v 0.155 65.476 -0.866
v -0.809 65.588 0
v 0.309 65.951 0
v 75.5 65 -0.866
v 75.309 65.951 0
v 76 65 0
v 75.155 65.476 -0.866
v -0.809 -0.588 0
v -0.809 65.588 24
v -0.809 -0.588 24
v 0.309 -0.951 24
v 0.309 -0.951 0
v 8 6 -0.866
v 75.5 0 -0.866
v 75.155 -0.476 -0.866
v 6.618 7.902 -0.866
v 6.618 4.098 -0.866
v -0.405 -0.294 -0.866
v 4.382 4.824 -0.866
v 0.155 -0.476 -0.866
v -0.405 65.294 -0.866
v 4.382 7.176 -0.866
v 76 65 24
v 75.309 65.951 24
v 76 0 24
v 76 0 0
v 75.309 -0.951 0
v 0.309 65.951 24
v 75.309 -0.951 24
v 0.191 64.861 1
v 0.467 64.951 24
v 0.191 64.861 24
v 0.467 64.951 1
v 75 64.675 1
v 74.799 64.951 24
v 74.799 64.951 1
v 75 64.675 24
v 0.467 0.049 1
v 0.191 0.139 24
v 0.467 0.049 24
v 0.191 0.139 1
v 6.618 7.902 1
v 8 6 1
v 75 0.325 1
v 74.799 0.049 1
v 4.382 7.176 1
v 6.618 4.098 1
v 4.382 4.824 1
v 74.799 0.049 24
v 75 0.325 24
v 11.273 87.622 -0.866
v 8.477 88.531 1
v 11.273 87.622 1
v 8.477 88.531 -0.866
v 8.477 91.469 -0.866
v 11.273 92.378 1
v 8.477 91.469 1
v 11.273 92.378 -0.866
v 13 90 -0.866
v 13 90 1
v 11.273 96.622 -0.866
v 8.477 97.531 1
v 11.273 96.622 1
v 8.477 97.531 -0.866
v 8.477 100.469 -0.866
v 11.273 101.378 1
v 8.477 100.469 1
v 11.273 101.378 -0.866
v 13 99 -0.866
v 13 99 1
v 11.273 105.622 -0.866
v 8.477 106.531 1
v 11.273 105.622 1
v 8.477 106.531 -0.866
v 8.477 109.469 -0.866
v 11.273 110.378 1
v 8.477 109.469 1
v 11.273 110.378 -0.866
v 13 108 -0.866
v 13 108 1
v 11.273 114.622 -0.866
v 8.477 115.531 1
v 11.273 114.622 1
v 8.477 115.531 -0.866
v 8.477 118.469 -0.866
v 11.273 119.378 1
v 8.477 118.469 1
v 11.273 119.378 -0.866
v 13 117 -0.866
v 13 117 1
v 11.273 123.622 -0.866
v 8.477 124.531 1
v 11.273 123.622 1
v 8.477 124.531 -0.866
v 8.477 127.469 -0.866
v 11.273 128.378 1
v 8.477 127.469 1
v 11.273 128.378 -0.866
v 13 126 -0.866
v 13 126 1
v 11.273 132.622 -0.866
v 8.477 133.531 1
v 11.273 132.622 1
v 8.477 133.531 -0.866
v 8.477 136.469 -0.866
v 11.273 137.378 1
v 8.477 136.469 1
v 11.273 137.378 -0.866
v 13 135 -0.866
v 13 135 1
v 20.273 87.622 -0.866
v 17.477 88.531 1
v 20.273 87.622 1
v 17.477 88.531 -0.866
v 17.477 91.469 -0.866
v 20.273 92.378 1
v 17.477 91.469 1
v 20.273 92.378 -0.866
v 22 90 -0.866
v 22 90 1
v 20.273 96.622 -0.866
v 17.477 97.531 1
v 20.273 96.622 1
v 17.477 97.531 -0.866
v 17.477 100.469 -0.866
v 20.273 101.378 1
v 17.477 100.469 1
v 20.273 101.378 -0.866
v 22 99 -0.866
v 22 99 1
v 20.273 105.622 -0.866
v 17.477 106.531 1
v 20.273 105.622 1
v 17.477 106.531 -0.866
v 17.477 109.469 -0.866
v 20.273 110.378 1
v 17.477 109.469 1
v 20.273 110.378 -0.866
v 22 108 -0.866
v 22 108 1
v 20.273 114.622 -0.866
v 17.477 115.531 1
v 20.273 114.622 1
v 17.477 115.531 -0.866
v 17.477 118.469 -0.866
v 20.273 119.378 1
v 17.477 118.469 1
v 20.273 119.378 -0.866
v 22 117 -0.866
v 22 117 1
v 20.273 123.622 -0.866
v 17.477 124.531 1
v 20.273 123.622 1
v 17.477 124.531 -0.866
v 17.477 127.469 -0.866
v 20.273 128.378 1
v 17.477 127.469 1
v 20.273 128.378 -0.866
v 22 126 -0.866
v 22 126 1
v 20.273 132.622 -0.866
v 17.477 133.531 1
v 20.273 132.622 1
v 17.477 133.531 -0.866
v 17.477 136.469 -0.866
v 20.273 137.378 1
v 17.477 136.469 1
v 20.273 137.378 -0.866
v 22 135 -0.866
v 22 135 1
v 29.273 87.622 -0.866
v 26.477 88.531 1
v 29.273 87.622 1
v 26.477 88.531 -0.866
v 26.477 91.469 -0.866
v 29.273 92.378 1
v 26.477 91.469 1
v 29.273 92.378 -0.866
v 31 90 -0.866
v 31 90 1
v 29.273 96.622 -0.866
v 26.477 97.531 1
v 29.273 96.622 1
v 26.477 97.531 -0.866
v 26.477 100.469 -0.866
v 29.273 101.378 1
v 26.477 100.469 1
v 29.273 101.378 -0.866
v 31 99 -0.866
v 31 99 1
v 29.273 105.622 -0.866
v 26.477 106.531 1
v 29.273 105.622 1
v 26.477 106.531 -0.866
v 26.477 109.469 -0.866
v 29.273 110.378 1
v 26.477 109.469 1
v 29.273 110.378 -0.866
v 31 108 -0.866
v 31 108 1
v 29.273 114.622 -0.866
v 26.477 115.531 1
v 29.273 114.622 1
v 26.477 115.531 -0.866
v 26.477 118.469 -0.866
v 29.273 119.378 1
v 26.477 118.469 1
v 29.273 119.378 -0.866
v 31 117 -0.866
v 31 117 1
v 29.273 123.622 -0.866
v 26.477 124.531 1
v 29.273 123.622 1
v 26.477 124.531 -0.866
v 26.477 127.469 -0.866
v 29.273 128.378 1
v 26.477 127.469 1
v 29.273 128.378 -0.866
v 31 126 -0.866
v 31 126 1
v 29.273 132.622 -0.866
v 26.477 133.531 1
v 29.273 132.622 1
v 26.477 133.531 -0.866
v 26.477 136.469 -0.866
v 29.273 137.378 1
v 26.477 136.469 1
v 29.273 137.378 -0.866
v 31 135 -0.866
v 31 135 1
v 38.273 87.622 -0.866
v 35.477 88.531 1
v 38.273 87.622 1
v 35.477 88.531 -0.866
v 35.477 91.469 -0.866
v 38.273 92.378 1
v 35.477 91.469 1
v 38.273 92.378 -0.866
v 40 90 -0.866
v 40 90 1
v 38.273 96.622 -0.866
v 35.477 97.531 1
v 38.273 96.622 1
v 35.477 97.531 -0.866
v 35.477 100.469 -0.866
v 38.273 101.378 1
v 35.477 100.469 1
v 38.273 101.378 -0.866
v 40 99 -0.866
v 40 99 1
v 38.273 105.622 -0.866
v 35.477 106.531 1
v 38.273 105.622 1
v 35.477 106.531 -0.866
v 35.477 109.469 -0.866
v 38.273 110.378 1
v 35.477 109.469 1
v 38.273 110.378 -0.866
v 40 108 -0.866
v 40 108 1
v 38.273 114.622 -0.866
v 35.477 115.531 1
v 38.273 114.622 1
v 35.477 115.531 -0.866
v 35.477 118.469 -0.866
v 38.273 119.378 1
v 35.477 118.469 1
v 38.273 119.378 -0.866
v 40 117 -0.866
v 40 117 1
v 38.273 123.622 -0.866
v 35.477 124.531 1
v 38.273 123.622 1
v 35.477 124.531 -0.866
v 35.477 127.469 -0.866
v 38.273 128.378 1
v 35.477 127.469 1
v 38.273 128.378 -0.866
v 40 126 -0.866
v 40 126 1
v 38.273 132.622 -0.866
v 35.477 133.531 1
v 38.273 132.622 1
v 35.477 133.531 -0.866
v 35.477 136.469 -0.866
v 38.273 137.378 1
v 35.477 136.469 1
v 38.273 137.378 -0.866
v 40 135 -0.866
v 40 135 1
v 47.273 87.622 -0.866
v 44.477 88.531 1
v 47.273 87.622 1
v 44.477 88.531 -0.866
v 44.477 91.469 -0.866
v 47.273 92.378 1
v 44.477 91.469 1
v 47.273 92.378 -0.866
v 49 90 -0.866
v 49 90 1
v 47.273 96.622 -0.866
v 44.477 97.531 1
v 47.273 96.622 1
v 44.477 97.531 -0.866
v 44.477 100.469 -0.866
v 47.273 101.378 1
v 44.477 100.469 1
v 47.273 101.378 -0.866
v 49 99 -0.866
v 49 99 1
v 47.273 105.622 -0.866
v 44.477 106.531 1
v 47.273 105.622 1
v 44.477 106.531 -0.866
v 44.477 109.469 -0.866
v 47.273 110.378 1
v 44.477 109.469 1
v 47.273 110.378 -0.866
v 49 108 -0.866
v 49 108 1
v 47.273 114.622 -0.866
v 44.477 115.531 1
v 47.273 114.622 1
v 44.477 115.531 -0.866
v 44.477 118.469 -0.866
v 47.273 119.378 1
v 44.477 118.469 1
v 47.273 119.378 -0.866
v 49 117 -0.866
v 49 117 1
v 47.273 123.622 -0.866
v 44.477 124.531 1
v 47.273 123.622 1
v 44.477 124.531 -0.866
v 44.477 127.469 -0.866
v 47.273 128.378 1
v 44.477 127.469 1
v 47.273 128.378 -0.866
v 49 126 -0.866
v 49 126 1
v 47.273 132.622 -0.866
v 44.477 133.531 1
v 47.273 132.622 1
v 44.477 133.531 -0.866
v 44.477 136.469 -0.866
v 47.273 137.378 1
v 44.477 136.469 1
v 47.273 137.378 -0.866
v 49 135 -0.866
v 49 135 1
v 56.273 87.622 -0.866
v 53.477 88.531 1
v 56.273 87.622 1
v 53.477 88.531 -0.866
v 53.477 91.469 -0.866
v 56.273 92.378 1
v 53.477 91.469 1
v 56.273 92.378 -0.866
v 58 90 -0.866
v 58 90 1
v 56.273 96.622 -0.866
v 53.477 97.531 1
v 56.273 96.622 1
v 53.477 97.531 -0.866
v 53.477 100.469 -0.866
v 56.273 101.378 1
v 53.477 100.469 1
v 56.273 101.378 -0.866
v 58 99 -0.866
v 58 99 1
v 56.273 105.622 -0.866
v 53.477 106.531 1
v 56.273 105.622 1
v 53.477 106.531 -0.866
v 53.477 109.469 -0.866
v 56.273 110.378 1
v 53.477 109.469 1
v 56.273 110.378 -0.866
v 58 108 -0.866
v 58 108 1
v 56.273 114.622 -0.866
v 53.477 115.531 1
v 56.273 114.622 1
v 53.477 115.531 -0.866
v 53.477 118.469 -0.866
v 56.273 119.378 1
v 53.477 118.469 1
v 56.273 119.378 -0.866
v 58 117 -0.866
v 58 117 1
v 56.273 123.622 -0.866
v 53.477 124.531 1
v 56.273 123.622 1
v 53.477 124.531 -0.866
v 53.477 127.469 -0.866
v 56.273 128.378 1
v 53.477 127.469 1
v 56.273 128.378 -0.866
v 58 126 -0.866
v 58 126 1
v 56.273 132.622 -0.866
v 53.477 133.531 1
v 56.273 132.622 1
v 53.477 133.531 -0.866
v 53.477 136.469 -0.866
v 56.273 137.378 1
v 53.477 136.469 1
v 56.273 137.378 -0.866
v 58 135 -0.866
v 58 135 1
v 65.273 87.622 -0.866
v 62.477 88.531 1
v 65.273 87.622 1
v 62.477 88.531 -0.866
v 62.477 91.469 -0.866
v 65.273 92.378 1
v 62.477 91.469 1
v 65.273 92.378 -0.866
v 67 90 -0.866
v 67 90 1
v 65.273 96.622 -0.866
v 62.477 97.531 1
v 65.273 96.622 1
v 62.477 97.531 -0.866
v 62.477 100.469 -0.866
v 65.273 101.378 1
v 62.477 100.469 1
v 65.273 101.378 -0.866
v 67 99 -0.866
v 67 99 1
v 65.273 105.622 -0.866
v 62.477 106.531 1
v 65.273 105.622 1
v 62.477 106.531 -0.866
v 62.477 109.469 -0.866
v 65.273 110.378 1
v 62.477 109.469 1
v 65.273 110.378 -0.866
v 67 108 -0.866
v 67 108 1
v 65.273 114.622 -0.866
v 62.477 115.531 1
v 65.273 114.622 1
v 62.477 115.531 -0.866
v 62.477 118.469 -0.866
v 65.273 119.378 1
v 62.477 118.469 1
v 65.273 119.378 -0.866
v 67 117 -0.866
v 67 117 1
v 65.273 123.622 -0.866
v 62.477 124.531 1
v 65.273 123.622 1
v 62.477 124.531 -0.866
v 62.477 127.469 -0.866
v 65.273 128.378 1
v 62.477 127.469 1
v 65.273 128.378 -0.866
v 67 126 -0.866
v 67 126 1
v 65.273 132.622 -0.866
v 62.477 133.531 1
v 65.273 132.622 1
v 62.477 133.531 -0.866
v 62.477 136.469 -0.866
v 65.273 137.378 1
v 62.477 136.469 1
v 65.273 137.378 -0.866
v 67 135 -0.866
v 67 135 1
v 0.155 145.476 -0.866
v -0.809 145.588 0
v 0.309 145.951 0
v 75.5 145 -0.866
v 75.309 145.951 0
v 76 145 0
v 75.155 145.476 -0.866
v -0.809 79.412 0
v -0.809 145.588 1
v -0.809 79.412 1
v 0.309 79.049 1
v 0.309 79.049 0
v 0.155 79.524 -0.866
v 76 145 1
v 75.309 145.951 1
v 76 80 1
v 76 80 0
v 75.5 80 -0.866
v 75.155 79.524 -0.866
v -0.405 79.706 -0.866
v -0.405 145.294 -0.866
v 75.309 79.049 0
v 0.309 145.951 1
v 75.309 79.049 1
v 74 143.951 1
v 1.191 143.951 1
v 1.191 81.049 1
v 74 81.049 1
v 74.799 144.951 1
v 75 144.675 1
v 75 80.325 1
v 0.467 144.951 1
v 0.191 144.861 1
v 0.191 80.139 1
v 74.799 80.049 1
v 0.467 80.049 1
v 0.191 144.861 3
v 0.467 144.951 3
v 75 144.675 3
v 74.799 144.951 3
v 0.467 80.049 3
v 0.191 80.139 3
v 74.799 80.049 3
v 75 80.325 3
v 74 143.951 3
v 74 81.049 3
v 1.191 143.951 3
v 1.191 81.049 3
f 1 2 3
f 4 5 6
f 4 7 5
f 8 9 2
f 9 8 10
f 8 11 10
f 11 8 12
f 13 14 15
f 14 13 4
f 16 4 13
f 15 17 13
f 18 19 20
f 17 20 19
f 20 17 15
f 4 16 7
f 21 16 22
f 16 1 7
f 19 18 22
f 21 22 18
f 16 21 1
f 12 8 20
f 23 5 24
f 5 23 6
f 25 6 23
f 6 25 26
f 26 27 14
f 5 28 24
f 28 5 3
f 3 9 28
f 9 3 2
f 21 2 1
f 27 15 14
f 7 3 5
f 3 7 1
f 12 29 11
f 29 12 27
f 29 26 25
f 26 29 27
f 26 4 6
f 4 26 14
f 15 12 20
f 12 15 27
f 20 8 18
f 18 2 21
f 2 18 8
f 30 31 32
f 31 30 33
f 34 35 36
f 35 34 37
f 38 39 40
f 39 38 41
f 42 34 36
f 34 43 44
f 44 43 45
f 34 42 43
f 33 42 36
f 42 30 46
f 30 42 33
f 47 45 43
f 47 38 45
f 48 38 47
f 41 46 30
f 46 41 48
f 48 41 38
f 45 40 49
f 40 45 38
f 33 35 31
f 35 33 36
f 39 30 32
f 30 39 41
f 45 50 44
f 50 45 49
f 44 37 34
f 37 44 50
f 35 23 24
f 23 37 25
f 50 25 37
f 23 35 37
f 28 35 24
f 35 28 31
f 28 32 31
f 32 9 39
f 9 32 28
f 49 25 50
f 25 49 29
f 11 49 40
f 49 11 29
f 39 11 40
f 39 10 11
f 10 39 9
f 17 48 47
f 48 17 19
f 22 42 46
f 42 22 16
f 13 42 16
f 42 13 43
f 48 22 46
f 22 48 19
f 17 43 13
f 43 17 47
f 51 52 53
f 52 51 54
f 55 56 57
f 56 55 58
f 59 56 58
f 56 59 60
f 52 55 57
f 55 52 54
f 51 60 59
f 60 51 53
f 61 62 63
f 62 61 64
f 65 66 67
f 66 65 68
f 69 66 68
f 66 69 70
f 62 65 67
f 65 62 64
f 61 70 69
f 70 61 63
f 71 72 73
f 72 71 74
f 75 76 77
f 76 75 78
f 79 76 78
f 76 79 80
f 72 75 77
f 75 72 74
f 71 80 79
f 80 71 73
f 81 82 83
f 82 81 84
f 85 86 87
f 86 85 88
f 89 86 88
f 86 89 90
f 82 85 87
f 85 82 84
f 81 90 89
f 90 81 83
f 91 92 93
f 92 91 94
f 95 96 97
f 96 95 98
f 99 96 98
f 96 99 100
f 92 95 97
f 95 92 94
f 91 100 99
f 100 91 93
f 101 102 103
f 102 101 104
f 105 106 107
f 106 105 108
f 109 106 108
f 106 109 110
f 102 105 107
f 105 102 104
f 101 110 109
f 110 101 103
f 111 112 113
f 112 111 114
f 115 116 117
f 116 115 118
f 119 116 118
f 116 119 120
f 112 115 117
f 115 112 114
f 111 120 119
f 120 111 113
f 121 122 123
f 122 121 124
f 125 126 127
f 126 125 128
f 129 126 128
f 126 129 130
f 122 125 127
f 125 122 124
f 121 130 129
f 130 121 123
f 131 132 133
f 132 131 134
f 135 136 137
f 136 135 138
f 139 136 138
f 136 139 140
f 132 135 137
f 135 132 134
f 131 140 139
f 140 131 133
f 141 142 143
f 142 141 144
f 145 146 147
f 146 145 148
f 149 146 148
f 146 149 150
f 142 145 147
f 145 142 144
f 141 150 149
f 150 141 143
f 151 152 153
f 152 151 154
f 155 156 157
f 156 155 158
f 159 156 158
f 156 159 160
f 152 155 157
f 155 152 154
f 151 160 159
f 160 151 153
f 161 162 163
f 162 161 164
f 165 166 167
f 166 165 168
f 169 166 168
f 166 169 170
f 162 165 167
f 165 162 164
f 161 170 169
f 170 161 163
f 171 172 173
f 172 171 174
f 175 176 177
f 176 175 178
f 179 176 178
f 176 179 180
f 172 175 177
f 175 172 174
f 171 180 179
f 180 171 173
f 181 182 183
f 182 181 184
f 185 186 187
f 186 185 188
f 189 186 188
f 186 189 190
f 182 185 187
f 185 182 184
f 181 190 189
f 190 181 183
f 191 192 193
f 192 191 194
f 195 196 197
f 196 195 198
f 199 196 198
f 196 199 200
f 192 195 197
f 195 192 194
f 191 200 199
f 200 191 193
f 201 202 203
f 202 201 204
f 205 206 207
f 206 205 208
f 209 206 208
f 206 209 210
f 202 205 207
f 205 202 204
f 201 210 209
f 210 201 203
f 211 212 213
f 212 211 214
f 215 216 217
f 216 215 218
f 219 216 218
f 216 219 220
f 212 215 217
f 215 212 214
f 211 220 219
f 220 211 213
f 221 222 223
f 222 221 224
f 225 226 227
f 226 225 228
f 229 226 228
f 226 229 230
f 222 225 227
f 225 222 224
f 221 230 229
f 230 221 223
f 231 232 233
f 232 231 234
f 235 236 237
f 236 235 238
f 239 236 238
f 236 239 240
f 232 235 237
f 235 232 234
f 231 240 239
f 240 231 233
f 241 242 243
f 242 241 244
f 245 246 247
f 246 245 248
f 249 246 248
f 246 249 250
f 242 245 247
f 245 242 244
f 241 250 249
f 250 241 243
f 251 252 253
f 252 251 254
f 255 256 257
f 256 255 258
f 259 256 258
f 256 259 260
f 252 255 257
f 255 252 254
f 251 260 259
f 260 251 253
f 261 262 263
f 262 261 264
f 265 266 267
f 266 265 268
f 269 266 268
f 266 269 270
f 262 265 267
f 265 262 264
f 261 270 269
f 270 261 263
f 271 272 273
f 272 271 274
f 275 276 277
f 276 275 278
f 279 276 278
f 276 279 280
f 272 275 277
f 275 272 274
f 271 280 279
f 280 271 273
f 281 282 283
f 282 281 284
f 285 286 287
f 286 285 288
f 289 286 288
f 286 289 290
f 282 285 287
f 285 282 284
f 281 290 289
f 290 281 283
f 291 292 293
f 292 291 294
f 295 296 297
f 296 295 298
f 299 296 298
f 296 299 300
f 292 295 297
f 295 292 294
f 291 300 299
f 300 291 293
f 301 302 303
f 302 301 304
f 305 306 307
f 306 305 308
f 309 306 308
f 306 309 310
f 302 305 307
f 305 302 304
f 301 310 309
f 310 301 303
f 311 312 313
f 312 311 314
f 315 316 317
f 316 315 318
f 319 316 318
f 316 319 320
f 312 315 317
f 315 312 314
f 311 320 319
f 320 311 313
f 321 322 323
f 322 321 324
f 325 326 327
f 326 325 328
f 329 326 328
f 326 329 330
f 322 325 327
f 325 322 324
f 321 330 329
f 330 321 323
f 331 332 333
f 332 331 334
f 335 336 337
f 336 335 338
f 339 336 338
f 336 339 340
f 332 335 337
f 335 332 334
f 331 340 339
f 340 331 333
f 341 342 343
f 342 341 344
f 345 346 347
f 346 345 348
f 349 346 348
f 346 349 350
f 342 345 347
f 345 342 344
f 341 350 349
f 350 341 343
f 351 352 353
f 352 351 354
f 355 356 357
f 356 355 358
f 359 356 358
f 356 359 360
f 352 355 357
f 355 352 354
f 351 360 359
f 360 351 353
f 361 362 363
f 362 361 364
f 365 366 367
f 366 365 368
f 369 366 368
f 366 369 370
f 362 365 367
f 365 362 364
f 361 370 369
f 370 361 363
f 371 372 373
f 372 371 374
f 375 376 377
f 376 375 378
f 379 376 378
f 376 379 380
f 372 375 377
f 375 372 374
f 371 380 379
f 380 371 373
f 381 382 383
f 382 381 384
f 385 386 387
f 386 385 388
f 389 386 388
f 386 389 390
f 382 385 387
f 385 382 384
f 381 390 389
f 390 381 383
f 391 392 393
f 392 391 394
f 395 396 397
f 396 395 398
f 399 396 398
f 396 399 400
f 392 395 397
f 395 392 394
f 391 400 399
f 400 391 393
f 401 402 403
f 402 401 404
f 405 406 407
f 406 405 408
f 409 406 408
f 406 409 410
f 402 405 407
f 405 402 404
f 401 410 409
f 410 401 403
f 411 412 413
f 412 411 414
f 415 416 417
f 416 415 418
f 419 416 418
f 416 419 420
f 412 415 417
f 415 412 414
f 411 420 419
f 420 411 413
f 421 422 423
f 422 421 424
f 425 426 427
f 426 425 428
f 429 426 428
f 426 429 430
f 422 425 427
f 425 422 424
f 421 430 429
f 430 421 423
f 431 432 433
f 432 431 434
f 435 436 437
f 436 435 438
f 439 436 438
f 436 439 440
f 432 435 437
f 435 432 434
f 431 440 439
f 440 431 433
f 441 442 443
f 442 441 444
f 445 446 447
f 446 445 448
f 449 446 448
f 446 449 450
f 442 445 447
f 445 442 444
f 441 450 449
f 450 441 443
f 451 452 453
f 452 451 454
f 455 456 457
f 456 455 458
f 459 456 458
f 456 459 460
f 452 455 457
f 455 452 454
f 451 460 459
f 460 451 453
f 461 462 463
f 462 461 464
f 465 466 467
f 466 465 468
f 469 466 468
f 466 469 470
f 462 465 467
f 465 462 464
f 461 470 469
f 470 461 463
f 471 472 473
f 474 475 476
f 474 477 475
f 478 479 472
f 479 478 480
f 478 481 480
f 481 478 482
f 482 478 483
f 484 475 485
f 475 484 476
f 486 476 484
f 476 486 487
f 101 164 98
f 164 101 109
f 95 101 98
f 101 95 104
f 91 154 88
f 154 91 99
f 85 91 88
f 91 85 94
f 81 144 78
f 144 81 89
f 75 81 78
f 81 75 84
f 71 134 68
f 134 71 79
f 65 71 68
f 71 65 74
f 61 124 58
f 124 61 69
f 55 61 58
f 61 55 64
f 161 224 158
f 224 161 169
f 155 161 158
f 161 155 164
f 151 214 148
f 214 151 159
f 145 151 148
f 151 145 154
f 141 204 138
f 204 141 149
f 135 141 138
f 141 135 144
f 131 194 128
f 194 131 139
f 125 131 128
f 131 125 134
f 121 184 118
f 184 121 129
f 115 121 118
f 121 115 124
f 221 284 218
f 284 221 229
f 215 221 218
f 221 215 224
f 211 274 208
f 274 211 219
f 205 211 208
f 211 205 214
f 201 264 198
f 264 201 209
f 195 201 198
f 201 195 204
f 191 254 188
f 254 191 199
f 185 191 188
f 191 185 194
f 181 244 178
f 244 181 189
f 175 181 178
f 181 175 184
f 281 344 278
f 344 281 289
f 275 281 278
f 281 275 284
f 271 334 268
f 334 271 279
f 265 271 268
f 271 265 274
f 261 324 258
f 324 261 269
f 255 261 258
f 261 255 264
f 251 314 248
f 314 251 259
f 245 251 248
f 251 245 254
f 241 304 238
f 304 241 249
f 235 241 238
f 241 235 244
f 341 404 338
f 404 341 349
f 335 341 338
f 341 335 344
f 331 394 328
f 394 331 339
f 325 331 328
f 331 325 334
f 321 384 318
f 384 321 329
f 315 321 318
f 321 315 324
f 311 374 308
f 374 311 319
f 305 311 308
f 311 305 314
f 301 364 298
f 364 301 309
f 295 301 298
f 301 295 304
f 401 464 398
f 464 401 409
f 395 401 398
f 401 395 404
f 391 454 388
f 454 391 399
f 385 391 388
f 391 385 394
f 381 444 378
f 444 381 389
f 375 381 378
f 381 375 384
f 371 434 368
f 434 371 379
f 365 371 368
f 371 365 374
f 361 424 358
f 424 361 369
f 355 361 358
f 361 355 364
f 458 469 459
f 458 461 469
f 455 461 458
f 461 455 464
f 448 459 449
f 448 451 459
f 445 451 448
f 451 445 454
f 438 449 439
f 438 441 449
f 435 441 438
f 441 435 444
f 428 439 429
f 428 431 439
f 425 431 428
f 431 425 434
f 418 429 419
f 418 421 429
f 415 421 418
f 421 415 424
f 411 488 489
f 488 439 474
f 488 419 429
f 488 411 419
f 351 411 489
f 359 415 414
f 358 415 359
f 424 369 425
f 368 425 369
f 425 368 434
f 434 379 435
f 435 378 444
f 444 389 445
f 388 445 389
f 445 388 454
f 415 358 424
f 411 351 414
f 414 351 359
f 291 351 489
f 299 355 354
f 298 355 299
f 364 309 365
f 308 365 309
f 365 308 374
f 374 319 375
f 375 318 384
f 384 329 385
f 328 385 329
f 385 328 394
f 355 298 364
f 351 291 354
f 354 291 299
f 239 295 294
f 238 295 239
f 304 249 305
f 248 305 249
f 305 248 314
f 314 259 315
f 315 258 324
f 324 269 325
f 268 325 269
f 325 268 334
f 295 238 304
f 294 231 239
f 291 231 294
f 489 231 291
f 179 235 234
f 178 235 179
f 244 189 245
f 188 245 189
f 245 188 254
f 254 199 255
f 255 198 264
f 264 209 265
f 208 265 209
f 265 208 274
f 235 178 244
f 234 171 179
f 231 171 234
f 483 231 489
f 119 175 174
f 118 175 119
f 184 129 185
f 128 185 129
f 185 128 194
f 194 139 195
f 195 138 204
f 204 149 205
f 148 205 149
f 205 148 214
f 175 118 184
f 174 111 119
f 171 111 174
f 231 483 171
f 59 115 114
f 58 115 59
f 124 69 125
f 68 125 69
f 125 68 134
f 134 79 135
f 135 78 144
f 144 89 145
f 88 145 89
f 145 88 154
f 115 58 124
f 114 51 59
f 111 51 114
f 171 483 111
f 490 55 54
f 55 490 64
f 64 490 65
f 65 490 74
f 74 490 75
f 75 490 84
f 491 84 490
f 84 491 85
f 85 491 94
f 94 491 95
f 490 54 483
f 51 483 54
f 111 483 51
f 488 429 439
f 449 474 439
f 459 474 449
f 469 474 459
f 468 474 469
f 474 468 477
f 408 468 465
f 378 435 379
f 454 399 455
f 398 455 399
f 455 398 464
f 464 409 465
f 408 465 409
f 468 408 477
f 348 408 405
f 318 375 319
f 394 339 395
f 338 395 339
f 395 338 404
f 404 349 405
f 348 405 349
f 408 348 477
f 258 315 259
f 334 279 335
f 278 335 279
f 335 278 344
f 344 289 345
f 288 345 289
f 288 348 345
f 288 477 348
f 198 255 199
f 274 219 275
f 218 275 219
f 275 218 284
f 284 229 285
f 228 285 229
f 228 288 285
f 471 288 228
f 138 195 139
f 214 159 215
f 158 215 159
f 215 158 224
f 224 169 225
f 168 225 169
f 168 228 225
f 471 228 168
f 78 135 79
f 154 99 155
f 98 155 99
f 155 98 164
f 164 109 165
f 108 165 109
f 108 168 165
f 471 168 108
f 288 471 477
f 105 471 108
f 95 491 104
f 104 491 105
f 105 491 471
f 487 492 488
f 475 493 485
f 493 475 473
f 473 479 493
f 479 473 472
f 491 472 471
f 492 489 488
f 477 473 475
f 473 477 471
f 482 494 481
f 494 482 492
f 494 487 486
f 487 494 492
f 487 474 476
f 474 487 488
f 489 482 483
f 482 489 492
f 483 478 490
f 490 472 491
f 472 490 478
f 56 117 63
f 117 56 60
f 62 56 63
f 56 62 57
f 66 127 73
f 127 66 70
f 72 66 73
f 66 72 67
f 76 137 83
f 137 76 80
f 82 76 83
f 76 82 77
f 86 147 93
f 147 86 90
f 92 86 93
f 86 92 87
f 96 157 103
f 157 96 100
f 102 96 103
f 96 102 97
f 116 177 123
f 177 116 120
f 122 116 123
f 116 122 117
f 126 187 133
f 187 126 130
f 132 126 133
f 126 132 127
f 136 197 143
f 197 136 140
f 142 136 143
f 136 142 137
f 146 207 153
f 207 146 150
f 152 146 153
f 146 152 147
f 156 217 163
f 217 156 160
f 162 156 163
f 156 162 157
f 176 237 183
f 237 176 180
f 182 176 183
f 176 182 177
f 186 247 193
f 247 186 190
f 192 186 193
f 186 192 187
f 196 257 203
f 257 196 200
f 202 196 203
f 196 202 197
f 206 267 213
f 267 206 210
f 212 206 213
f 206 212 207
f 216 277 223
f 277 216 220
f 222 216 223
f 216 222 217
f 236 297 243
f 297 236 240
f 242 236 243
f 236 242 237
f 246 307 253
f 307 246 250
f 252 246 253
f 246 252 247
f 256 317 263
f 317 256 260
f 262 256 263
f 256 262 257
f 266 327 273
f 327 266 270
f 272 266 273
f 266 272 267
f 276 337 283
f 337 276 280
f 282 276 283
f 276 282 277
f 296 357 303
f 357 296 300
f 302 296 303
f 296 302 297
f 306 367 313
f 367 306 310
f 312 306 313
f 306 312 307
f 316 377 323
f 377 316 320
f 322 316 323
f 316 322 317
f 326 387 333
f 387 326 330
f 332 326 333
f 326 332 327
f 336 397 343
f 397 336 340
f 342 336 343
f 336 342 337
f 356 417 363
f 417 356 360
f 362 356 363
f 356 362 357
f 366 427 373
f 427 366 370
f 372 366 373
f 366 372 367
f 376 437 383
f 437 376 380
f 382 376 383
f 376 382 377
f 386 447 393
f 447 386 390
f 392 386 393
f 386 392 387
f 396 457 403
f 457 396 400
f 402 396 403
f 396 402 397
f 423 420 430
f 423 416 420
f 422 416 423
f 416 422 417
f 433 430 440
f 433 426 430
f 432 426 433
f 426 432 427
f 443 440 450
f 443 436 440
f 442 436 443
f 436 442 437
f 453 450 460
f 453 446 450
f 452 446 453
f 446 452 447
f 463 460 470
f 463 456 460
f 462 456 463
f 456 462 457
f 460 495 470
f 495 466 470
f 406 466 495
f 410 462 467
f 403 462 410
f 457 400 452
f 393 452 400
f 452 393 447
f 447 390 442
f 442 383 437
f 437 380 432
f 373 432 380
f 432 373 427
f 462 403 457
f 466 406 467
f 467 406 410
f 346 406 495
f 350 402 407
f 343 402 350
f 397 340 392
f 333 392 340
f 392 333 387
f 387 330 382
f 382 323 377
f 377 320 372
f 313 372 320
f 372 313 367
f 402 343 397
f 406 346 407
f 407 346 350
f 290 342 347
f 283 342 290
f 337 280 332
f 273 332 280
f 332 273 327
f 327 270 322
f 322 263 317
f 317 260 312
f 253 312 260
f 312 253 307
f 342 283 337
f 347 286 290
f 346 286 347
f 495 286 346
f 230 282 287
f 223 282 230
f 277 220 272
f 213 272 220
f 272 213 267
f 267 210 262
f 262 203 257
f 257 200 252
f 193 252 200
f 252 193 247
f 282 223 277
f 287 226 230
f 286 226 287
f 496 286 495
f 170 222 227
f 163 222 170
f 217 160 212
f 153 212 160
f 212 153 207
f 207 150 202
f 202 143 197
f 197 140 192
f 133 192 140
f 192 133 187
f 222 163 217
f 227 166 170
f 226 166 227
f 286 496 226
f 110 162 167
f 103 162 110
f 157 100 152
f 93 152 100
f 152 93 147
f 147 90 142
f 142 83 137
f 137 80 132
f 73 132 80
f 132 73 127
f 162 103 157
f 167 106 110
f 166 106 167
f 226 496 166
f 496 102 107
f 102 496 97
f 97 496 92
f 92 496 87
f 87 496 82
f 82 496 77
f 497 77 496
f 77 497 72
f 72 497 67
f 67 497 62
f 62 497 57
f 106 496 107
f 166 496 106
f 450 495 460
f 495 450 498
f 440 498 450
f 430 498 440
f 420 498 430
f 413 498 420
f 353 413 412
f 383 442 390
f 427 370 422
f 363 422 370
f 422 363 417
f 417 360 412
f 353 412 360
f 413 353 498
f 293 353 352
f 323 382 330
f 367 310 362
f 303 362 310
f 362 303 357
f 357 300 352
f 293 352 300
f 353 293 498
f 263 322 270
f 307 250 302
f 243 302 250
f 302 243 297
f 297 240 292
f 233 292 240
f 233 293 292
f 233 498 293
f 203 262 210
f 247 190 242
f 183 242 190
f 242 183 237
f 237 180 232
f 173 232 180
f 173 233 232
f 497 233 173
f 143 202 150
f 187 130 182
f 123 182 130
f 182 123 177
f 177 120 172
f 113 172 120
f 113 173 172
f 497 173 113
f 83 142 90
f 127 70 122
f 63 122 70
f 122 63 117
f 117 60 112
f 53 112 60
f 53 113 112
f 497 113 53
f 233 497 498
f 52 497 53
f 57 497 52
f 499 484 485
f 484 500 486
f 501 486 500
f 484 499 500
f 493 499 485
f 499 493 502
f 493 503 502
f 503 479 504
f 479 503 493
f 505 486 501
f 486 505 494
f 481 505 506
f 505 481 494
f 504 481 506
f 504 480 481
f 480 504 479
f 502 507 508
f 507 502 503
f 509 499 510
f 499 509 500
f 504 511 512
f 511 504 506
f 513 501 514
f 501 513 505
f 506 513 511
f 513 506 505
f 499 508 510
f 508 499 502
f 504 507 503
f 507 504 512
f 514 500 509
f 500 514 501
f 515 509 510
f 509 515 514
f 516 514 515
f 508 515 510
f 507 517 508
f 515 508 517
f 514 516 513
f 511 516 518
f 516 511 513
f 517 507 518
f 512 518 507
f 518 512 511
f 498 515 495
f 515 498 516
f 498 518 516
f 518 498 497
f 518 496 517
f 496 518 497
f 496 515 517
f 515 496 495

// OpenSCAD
length = 75;
width = 65;
height = 25;

// minimum dimensions 70x60x50 mm, must leave space for battery box (50x60 mm) and cord; can make smaller height if you simplify circuit (less than one resistor per led, not pointing in height direction)
 
$fn = 5;
 
led = 5;
spacing = 4;
border = 8;
//thickness = 3;

nx = 7;
ny = 6;

wall = 1;		// thickness of box walls
cut = height-wall; // where to separate lid from box (where is seam)

lip = 3; // height of lip in units of wall

pin = 5.25; // diameter of pin (wire) to hold lid to box
np = 0; // number of pins per side

ep = 0.01; // fudge factor - if there is 'sprue, adjust
printspace = 15; // distance between lid and box

// make corners
points = [for (i=[0,1], j=[0:1],k=[0:1]) [length*i, width*j, height*k]];
	
module shell(w,p) { // make walls by making whole volume p=points, w=thickness
	hull(){
        for (q=p) { //outside wall
            translate(q) sphere(w);
        }
    }
}

module ext(h,w,t){ // remove volume that isnt walls h=height to extrude, w=thickness, t = wall-lip separation
	
		translate([0,0,t]) 
		linear_extrude(h) offset(r=-w) 
		projection() shell(wall,points);
}

module slice(w,c){ // w=wall (fudge factors), c = cut line
	translate([-w-1-ep,-w-1-ep,c]) cube([2*(length+ep),2*(width+ep),2*height]); } 
	
module pins(n,x,y,loc,dia,w) { //add locking pins; n = number, x = space to put in, loc = location (height of holes), dia = diameter of holes, w=wall thickness
	echo(n,x,y,loc,dia,w);
	if (n != 0) for (i = [1:n]){
		translate([i*x/n - x/(2*n),-w,loc]) 
			rotate([-90,0,0]) 
			cylinder(d=dia, h=3*w);	
		translate([i*x/n - x/(2*n),y-2*w,loc]) 
			rotate([-90,0,0]) 
			cylinder(d=dia, h=3*w);

	}
}	

module ledgrid(){
	translate(0.5*[length, width,0]) 
	translate([-(border+(nx/2 -1/2)*(led+spacing)),-(border+(ny/2 -1/2)*(led+spacing)),0])
	for (i=[0:nx-1],j=[0:ny-1]){
	translate([border+i*(led+spacing),border+j*(led+spacing),-height/2])
		cylinder(d=led,h=2+height);}
}

difference(){ //box
   	shell(wall,points);
	ext(height,wall,wall);
	slice(wall,cut);
	pins(np,length,width,cut-wall,pin,wall);
	
	// power cord - usb
	translate([6,6,-height/2]) cylinder(h=height,r=2);

}
translate([0,width + printspace,0]){  //lid
	difference(){
    	shell(wall,points);
		ext(height,wall,wall);
		slice(wall,height-cut); 
		// make box, but only keep lid
		
		ledgrid();
}
	
	difference(){ 
	// make lip of box by making and removing smaller boxes
		ext(height,wall,wall);
		slice(2*wall,lip*(height-cut));
		ext(height,2*wall,wall);
	
		//	pins(np,length,width,height-(cut-wall),pin,wall);

		ledgrid();

	}
}
